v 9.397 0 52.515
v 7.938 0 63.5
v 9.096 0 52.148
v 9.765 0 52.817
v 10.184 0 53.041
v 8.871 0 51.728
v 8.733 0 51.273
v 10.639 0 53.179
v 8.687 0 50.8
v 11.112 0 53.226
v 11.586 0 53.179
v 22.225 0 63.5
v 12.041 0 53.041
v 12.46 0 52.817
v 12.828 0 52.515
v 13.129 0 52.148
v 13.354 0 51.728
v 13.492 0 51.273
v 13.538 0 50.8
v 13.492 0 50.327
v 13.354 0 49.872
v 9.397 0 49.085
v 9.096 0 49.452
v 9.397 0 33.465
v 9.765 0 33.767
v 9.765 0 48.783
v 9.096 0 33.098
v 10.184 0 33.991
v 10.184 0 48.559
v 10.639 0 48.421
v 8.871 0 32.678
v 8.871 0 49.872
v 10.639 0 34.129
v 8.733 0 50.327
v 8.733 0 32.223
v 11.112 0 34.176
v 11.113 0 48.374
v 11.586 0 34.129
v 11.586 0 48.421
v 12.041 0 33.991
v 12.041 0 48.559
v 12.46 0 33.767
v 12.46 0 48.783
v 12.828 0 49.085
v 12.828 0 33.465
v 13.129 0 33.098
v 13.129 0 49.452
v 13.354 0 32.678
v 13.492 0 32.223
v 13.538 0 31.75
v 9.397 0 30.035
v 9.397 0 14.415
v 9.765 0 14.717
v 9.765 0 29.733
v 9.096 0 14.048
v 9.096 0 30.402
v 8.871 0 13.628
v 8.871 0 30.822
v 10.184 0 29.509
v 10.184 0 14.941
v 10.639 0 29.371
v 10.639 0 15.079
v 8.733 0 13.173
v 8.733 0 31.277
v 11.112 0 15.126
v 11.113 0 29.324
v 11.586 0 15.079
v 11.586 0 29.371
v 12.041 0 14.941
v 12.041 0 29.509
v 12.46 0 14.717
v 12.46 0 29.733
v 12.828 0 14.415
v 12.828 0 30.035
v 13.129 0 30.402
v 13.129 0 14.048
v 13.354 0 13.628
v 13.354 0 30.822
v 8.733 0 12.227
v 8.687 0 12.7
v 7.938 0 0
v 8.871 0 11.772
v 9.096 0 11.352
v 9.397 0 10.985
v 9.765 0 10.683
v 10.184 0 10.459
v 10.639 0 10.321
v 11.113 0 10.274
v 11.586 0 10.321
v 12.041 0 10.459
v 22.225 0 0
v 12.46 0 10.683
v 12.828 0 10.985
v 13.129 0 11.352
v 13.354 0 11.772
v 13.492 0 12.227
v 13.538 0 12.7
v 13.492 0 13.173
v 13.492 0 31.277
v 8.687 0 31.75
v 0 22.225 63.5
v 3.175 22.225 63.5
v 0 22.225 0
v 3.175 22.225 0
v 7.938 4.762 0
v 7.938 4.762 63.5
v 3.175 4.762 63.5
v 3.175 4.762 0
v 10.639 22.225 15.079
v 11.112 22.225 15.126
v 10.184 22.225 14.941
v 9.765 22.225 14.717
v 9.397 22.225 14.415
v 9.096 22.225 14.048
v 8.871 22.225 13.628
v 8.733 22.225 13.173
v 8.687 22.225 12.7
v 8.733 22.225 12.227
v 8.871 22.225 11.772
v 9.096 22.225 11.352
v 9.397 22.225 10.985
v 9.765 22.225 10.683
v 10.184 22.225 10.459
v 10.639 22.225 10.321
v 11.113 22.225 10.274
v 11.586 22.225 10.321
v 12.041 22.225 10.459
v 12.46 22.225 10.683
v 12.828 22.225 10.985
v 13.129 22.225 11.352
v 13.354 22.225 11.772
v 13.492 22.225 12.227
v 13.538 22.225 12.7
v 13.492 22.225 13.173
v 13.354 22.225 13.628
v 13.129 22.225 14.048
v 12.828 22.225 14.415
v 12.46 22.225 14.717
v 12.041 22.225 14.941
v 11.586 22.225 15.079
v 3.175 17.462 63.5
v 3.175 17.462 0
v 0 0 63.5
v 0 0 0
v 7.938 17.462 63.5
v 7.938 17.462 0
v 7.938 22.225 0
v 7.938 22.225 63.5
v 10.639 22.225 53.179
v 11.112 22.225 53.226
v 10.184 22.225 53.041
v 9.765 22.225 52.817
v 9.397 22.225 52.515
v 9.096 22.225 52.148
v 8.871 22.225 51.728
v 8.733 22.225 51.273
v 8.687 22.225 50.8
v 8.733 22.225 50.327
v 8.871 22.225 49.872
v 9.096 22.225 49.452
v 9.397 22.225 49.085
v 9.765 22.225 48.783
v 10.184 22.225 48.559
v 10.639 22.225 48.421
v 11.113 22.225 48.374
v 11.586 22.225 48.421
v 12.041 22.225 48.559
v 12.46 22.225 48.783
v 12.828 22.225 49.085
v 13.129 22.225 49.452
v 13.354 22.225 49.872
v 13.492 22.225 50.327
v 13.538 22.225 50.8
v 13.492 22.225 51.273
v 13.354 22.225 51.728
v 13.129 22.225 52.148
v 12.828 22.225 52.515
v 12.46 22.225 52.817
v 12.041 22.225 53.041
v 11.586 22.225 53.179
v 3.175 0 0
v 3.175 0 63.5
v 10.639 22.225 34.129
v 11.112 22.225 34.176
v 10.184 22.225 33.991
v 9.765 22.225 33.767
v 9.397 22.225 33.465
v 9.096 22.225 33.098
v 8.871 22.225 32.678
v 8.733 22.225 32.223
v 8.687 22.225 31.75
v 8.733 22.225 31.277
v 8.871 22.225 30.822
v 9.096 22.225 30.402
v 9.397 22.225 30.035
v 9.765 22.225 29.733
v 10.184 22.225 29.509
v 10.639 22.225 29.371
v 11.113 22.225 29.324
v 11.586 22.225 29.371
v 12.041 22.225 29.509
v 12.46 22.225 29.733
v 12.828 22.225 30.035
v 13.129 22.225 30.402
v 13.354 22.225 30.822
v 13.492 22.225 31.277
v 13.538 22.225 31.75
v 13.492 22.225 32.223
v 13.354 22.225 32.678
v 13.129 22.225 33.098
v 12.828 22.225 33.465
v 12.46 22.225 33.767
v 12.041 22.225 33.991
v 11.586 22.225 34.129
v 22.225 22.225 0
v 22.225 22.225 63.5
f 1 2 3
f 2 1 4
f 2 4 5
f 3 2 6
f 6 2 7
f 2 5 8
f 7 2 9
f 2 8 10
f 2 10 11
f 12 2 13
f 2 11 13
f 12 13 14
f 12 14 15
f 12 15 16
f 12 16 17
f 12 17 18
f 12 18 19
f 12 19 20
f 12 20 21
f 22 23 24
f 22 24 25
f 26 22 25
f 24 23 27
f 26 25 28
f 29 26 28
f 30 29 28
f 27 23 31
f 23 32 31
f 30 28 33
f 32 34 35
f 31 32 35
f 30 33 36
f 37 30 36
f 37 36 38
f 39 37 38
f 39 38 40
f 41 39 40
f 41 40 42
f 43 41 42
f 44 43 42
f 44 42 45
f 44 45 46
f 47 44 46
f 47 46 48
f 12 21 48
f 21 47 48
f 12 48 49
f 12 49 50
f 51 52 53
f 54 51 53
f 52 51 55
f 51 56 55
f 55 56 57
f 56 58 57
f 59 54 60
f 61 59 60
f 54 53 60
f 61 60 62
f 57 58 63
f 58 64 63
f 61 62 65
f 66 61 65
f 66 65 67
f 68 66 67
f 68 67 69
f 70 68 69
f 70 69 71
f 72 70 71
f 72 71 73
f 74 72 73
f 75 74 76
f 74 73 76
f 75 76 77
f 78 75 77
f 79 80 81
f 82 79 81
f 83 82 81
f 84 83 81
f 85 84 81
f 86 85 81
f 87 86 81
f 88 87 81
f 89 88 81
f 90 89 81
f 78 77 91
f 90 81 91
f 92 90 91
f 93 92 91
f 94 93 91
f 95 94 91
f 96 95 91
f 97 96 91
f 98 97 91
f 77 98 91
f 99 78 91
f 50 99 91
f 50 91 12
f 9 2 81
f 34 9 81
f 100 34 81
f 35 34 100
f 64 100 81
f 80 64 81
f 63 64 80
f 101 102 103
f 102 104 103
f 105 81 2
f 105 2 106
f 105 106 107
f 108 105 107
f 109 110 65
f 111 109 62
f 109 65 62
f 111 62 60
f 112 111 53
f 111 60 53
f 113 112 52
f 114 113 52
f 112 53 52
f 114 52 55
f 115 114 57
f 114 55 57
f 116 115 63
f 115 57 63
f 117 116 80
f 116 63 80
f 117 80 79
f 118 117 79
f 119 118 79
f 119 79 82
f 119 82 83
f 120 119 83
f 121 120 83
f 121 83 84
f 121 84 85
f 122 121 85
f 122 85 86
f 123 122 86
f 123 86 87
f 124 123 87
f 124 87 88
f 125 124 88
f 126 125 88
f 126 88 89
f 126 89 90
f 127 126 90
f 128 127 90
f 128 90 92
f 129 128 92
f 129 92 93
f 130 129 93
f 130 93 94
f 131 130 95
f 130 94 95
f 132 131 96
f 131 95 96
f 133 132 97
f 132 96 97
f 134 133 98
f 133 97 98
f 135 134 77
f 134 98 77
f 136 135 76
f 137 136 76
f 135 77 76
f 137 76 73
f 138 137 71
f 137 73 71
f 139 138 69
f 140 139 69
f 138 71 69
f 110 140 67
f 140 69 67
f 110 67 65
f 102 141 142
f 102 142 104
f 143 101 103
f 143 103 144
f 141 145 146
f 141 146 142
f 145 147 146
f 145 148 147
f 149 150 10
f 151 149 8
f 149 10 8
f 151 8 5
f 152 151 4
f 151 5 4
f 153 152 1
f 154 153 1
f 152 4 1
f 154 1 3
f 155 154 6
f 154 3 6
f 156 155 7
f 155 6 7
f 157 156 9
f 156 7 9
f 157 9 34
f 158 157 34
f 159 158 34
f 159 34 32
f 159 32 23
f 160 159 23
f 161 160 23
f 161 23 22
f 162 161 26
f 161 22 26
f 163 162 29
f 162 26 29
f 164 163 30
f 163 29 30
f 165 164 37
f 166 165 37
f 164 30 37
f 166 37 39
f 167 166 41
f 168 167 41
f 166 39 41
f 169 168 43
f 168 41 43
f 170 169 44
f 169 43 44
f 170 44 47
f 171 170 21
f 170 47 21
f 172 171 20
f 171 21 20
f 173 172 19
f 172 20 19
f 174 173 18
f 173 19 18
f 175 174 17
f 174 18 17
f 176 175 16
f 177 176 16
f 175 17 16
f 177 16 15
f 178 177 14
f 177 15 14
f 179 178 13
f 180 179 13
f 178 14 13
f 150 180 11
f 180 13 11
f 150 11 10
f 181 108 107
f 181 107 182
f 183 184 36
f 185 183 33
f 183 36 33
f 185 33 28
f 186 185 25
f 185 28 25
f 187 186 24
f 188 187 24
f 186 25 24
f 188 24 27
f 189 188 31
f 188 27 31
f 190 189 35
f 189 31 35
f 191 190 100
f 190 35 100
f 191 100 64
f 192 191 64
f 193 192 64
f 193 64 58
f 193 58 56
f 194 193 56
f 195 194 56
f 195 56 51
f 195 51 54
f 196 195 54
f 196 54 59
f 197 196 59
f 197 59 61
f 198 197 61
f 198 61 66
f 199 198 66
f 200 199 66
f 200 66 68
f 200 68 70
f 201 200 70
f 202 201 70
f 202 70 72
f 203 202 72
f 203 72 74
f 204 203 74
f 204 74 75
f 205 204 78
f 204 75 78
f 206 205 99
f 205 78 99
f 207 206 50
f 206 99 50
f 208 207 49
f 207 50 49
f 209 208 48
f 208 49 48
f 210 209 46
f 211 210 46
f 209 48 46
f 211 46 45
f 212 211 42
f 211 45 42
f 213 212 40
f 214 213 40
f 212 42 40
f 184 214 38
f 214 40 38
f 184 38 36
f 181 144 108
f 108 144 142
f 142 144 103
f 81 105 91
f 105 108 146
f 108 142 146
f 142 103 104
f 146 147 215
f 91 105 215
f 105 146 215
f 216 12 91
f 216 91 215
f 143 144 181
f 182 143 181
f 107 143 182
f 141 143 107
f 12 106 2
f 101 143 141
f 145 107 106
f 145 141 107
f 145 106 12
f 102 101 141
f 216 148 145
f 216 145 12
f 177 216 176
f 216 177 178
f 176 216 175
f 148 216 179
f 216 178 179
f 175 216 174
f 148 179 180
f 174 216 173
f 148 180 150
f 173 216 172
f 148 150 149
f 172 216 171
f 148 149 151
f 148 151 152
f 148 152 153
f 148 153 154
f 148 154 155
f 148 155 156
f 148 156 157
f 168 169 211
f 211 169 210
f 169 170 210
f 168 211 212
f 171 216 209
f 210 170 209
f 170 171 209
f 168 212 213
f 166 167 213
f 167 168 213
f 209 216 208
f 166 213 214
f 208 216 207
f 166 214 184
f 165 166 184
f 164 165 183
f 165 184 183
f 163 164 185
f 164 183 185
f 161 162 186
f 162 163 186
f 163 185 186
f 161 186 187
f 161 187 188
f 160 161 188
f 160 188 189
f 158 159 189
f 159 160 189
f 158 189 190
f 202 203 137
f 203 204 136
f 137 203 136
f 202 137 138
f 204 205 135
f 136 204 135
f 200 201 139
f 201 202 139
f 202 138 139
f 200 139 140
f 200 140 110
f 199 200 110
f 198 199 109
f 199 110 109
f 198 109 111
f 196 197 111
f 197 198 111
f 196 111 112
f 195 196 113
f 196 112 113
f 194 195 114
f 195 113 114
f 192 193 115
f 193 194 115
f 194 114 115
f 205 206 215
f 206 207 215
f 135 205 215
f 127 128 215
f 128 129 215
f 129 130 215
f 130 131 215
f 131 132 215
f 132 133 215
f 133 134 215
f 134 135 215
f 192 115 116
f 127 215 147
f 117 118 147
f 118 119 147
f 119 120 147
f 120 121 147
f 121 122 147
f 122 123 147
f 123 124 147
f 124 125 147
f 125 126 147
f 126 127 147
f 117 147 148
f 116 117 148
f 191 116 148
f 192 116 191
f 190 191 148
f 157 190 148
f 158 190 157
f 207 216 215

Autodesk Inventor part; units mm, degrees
ref_plane "YZ Plane" through (0, 0, 0) normal (1, 0, 0) x (0, 1, 0)
ref_plane "XZ Plane" through (0, 0, 0) normal (0, 1, 0) x (-1, 0, 0)
ref_plane "XY Plane" through (0, 0, 0) normal (0, 0, 1) x (1, 0, 0)
sketch "Sketch1" plane through (0, 0, 0) normal (0, 0, 1) x (1, 0, 0)
  line L0 (0, 0) -> (22.225, 0)
  line L1 (22.225, 0) -> (22.225, 22.225)
  line L2 (22.225, 22.225) -> (0, 22.225)
  line L3 (0, 22.225) -> (0, 0)
  dimension "d0" = 22.225
extrude "Extrusion1" add sketch "Sketch1" along normal blind 63.5
sketch "Sketch2" plane through (0, 22.225, 0) normal (0, 1, 0) x (1, 0, 0)
  line L0 (0, 0) -> (0, -63.5) projected
  line L1 (22.225, -63.5) -> (0, -63.5) projected
  line L2 (22.225, 0) -> (0, 0) projected
  point P0 (11.1125, -12.7)
  point P1 (11.1125, -31.75)
  point P2 (11.1125, -50.8)
  point P3 (11.1125, 0)
  dimension "d26" = 12.7
  dimension "d28" = 19.05
  dimension "d29" = 19.05
hole "Hole1" at (11.1125, 22.225, 12.7) at (11.1125, 22.225, 31.75) at (11.1125, 22.225, 50.8) direction (0, -1, 0) diameter 4.8514 end through all
sketch "Sketch3" plane through (0, 0, 63.5) normal (0, 0, 1) x (1, 0, 0)
  line L0 (22.225, 22.225) -> (0, 22.225) projected
  line L1 (22.225, 0) -> (22.225, 22.225) projected
  line L2 (0, 22.225) -> (0, 0) projected
  line L3 (0, 0) -> (22.225, 0) projected
  point P0 (4.7625, 17.4625)
  point P1 (4.7625, 4.7625)
  dimension "d21" = 4.7625
  dimension "d22" = 4.7625
  dimension "d31" = 4.7625
hole "Hole2" [suppressed]
sketch "Sketch4" plane through (0, 0, 63.5) normal (0, 0, 1) x (1, 0, 0)
  line L0 (3.175, 27.2947) -> (7.9375, 27.2947)
  line L1 (7.9375, 27.2947) -> (7.9375, 17.4625)
  line L2 (7.9375, 17.4625) -> (3.175, 17.4625)
  line L3 (3.175, 17.4625) -> (3.175, 27.2947)
  line L4 (3.175, -4.5253) -> (7.9375, -4.5253)
  line L5 (7.9375, -4.5253) -> (7.9375, 4.7625)
  line L6 (7.9375, 4.7625) -> (3.175, 4.7625)
  line L7 (3.175, 4.7625) -> (3.175, -4.5253)
  line L8 (0, 0) -> (22.225, 0) projected
  line L9 (22.225, 22.225) -> (0, 22.225) projected
  line L10 (0, 22.225) -> (0, 0) projected
  dimension "d32" = 4.7625
  dimension "d33" = 4.7625
  dimension "d34" = 4.7625
  dimension "d35" = 7.9375
  dimension "d38" = 3.175
extrude "Extrusion2" cut sketch "Sketch4" against normal through all
equation "\"d31\" = d21"
equation "\"d34\" = d33"
properties part number "CLB_052_ScissorLiftPlug" material "Nylon 6/6"
